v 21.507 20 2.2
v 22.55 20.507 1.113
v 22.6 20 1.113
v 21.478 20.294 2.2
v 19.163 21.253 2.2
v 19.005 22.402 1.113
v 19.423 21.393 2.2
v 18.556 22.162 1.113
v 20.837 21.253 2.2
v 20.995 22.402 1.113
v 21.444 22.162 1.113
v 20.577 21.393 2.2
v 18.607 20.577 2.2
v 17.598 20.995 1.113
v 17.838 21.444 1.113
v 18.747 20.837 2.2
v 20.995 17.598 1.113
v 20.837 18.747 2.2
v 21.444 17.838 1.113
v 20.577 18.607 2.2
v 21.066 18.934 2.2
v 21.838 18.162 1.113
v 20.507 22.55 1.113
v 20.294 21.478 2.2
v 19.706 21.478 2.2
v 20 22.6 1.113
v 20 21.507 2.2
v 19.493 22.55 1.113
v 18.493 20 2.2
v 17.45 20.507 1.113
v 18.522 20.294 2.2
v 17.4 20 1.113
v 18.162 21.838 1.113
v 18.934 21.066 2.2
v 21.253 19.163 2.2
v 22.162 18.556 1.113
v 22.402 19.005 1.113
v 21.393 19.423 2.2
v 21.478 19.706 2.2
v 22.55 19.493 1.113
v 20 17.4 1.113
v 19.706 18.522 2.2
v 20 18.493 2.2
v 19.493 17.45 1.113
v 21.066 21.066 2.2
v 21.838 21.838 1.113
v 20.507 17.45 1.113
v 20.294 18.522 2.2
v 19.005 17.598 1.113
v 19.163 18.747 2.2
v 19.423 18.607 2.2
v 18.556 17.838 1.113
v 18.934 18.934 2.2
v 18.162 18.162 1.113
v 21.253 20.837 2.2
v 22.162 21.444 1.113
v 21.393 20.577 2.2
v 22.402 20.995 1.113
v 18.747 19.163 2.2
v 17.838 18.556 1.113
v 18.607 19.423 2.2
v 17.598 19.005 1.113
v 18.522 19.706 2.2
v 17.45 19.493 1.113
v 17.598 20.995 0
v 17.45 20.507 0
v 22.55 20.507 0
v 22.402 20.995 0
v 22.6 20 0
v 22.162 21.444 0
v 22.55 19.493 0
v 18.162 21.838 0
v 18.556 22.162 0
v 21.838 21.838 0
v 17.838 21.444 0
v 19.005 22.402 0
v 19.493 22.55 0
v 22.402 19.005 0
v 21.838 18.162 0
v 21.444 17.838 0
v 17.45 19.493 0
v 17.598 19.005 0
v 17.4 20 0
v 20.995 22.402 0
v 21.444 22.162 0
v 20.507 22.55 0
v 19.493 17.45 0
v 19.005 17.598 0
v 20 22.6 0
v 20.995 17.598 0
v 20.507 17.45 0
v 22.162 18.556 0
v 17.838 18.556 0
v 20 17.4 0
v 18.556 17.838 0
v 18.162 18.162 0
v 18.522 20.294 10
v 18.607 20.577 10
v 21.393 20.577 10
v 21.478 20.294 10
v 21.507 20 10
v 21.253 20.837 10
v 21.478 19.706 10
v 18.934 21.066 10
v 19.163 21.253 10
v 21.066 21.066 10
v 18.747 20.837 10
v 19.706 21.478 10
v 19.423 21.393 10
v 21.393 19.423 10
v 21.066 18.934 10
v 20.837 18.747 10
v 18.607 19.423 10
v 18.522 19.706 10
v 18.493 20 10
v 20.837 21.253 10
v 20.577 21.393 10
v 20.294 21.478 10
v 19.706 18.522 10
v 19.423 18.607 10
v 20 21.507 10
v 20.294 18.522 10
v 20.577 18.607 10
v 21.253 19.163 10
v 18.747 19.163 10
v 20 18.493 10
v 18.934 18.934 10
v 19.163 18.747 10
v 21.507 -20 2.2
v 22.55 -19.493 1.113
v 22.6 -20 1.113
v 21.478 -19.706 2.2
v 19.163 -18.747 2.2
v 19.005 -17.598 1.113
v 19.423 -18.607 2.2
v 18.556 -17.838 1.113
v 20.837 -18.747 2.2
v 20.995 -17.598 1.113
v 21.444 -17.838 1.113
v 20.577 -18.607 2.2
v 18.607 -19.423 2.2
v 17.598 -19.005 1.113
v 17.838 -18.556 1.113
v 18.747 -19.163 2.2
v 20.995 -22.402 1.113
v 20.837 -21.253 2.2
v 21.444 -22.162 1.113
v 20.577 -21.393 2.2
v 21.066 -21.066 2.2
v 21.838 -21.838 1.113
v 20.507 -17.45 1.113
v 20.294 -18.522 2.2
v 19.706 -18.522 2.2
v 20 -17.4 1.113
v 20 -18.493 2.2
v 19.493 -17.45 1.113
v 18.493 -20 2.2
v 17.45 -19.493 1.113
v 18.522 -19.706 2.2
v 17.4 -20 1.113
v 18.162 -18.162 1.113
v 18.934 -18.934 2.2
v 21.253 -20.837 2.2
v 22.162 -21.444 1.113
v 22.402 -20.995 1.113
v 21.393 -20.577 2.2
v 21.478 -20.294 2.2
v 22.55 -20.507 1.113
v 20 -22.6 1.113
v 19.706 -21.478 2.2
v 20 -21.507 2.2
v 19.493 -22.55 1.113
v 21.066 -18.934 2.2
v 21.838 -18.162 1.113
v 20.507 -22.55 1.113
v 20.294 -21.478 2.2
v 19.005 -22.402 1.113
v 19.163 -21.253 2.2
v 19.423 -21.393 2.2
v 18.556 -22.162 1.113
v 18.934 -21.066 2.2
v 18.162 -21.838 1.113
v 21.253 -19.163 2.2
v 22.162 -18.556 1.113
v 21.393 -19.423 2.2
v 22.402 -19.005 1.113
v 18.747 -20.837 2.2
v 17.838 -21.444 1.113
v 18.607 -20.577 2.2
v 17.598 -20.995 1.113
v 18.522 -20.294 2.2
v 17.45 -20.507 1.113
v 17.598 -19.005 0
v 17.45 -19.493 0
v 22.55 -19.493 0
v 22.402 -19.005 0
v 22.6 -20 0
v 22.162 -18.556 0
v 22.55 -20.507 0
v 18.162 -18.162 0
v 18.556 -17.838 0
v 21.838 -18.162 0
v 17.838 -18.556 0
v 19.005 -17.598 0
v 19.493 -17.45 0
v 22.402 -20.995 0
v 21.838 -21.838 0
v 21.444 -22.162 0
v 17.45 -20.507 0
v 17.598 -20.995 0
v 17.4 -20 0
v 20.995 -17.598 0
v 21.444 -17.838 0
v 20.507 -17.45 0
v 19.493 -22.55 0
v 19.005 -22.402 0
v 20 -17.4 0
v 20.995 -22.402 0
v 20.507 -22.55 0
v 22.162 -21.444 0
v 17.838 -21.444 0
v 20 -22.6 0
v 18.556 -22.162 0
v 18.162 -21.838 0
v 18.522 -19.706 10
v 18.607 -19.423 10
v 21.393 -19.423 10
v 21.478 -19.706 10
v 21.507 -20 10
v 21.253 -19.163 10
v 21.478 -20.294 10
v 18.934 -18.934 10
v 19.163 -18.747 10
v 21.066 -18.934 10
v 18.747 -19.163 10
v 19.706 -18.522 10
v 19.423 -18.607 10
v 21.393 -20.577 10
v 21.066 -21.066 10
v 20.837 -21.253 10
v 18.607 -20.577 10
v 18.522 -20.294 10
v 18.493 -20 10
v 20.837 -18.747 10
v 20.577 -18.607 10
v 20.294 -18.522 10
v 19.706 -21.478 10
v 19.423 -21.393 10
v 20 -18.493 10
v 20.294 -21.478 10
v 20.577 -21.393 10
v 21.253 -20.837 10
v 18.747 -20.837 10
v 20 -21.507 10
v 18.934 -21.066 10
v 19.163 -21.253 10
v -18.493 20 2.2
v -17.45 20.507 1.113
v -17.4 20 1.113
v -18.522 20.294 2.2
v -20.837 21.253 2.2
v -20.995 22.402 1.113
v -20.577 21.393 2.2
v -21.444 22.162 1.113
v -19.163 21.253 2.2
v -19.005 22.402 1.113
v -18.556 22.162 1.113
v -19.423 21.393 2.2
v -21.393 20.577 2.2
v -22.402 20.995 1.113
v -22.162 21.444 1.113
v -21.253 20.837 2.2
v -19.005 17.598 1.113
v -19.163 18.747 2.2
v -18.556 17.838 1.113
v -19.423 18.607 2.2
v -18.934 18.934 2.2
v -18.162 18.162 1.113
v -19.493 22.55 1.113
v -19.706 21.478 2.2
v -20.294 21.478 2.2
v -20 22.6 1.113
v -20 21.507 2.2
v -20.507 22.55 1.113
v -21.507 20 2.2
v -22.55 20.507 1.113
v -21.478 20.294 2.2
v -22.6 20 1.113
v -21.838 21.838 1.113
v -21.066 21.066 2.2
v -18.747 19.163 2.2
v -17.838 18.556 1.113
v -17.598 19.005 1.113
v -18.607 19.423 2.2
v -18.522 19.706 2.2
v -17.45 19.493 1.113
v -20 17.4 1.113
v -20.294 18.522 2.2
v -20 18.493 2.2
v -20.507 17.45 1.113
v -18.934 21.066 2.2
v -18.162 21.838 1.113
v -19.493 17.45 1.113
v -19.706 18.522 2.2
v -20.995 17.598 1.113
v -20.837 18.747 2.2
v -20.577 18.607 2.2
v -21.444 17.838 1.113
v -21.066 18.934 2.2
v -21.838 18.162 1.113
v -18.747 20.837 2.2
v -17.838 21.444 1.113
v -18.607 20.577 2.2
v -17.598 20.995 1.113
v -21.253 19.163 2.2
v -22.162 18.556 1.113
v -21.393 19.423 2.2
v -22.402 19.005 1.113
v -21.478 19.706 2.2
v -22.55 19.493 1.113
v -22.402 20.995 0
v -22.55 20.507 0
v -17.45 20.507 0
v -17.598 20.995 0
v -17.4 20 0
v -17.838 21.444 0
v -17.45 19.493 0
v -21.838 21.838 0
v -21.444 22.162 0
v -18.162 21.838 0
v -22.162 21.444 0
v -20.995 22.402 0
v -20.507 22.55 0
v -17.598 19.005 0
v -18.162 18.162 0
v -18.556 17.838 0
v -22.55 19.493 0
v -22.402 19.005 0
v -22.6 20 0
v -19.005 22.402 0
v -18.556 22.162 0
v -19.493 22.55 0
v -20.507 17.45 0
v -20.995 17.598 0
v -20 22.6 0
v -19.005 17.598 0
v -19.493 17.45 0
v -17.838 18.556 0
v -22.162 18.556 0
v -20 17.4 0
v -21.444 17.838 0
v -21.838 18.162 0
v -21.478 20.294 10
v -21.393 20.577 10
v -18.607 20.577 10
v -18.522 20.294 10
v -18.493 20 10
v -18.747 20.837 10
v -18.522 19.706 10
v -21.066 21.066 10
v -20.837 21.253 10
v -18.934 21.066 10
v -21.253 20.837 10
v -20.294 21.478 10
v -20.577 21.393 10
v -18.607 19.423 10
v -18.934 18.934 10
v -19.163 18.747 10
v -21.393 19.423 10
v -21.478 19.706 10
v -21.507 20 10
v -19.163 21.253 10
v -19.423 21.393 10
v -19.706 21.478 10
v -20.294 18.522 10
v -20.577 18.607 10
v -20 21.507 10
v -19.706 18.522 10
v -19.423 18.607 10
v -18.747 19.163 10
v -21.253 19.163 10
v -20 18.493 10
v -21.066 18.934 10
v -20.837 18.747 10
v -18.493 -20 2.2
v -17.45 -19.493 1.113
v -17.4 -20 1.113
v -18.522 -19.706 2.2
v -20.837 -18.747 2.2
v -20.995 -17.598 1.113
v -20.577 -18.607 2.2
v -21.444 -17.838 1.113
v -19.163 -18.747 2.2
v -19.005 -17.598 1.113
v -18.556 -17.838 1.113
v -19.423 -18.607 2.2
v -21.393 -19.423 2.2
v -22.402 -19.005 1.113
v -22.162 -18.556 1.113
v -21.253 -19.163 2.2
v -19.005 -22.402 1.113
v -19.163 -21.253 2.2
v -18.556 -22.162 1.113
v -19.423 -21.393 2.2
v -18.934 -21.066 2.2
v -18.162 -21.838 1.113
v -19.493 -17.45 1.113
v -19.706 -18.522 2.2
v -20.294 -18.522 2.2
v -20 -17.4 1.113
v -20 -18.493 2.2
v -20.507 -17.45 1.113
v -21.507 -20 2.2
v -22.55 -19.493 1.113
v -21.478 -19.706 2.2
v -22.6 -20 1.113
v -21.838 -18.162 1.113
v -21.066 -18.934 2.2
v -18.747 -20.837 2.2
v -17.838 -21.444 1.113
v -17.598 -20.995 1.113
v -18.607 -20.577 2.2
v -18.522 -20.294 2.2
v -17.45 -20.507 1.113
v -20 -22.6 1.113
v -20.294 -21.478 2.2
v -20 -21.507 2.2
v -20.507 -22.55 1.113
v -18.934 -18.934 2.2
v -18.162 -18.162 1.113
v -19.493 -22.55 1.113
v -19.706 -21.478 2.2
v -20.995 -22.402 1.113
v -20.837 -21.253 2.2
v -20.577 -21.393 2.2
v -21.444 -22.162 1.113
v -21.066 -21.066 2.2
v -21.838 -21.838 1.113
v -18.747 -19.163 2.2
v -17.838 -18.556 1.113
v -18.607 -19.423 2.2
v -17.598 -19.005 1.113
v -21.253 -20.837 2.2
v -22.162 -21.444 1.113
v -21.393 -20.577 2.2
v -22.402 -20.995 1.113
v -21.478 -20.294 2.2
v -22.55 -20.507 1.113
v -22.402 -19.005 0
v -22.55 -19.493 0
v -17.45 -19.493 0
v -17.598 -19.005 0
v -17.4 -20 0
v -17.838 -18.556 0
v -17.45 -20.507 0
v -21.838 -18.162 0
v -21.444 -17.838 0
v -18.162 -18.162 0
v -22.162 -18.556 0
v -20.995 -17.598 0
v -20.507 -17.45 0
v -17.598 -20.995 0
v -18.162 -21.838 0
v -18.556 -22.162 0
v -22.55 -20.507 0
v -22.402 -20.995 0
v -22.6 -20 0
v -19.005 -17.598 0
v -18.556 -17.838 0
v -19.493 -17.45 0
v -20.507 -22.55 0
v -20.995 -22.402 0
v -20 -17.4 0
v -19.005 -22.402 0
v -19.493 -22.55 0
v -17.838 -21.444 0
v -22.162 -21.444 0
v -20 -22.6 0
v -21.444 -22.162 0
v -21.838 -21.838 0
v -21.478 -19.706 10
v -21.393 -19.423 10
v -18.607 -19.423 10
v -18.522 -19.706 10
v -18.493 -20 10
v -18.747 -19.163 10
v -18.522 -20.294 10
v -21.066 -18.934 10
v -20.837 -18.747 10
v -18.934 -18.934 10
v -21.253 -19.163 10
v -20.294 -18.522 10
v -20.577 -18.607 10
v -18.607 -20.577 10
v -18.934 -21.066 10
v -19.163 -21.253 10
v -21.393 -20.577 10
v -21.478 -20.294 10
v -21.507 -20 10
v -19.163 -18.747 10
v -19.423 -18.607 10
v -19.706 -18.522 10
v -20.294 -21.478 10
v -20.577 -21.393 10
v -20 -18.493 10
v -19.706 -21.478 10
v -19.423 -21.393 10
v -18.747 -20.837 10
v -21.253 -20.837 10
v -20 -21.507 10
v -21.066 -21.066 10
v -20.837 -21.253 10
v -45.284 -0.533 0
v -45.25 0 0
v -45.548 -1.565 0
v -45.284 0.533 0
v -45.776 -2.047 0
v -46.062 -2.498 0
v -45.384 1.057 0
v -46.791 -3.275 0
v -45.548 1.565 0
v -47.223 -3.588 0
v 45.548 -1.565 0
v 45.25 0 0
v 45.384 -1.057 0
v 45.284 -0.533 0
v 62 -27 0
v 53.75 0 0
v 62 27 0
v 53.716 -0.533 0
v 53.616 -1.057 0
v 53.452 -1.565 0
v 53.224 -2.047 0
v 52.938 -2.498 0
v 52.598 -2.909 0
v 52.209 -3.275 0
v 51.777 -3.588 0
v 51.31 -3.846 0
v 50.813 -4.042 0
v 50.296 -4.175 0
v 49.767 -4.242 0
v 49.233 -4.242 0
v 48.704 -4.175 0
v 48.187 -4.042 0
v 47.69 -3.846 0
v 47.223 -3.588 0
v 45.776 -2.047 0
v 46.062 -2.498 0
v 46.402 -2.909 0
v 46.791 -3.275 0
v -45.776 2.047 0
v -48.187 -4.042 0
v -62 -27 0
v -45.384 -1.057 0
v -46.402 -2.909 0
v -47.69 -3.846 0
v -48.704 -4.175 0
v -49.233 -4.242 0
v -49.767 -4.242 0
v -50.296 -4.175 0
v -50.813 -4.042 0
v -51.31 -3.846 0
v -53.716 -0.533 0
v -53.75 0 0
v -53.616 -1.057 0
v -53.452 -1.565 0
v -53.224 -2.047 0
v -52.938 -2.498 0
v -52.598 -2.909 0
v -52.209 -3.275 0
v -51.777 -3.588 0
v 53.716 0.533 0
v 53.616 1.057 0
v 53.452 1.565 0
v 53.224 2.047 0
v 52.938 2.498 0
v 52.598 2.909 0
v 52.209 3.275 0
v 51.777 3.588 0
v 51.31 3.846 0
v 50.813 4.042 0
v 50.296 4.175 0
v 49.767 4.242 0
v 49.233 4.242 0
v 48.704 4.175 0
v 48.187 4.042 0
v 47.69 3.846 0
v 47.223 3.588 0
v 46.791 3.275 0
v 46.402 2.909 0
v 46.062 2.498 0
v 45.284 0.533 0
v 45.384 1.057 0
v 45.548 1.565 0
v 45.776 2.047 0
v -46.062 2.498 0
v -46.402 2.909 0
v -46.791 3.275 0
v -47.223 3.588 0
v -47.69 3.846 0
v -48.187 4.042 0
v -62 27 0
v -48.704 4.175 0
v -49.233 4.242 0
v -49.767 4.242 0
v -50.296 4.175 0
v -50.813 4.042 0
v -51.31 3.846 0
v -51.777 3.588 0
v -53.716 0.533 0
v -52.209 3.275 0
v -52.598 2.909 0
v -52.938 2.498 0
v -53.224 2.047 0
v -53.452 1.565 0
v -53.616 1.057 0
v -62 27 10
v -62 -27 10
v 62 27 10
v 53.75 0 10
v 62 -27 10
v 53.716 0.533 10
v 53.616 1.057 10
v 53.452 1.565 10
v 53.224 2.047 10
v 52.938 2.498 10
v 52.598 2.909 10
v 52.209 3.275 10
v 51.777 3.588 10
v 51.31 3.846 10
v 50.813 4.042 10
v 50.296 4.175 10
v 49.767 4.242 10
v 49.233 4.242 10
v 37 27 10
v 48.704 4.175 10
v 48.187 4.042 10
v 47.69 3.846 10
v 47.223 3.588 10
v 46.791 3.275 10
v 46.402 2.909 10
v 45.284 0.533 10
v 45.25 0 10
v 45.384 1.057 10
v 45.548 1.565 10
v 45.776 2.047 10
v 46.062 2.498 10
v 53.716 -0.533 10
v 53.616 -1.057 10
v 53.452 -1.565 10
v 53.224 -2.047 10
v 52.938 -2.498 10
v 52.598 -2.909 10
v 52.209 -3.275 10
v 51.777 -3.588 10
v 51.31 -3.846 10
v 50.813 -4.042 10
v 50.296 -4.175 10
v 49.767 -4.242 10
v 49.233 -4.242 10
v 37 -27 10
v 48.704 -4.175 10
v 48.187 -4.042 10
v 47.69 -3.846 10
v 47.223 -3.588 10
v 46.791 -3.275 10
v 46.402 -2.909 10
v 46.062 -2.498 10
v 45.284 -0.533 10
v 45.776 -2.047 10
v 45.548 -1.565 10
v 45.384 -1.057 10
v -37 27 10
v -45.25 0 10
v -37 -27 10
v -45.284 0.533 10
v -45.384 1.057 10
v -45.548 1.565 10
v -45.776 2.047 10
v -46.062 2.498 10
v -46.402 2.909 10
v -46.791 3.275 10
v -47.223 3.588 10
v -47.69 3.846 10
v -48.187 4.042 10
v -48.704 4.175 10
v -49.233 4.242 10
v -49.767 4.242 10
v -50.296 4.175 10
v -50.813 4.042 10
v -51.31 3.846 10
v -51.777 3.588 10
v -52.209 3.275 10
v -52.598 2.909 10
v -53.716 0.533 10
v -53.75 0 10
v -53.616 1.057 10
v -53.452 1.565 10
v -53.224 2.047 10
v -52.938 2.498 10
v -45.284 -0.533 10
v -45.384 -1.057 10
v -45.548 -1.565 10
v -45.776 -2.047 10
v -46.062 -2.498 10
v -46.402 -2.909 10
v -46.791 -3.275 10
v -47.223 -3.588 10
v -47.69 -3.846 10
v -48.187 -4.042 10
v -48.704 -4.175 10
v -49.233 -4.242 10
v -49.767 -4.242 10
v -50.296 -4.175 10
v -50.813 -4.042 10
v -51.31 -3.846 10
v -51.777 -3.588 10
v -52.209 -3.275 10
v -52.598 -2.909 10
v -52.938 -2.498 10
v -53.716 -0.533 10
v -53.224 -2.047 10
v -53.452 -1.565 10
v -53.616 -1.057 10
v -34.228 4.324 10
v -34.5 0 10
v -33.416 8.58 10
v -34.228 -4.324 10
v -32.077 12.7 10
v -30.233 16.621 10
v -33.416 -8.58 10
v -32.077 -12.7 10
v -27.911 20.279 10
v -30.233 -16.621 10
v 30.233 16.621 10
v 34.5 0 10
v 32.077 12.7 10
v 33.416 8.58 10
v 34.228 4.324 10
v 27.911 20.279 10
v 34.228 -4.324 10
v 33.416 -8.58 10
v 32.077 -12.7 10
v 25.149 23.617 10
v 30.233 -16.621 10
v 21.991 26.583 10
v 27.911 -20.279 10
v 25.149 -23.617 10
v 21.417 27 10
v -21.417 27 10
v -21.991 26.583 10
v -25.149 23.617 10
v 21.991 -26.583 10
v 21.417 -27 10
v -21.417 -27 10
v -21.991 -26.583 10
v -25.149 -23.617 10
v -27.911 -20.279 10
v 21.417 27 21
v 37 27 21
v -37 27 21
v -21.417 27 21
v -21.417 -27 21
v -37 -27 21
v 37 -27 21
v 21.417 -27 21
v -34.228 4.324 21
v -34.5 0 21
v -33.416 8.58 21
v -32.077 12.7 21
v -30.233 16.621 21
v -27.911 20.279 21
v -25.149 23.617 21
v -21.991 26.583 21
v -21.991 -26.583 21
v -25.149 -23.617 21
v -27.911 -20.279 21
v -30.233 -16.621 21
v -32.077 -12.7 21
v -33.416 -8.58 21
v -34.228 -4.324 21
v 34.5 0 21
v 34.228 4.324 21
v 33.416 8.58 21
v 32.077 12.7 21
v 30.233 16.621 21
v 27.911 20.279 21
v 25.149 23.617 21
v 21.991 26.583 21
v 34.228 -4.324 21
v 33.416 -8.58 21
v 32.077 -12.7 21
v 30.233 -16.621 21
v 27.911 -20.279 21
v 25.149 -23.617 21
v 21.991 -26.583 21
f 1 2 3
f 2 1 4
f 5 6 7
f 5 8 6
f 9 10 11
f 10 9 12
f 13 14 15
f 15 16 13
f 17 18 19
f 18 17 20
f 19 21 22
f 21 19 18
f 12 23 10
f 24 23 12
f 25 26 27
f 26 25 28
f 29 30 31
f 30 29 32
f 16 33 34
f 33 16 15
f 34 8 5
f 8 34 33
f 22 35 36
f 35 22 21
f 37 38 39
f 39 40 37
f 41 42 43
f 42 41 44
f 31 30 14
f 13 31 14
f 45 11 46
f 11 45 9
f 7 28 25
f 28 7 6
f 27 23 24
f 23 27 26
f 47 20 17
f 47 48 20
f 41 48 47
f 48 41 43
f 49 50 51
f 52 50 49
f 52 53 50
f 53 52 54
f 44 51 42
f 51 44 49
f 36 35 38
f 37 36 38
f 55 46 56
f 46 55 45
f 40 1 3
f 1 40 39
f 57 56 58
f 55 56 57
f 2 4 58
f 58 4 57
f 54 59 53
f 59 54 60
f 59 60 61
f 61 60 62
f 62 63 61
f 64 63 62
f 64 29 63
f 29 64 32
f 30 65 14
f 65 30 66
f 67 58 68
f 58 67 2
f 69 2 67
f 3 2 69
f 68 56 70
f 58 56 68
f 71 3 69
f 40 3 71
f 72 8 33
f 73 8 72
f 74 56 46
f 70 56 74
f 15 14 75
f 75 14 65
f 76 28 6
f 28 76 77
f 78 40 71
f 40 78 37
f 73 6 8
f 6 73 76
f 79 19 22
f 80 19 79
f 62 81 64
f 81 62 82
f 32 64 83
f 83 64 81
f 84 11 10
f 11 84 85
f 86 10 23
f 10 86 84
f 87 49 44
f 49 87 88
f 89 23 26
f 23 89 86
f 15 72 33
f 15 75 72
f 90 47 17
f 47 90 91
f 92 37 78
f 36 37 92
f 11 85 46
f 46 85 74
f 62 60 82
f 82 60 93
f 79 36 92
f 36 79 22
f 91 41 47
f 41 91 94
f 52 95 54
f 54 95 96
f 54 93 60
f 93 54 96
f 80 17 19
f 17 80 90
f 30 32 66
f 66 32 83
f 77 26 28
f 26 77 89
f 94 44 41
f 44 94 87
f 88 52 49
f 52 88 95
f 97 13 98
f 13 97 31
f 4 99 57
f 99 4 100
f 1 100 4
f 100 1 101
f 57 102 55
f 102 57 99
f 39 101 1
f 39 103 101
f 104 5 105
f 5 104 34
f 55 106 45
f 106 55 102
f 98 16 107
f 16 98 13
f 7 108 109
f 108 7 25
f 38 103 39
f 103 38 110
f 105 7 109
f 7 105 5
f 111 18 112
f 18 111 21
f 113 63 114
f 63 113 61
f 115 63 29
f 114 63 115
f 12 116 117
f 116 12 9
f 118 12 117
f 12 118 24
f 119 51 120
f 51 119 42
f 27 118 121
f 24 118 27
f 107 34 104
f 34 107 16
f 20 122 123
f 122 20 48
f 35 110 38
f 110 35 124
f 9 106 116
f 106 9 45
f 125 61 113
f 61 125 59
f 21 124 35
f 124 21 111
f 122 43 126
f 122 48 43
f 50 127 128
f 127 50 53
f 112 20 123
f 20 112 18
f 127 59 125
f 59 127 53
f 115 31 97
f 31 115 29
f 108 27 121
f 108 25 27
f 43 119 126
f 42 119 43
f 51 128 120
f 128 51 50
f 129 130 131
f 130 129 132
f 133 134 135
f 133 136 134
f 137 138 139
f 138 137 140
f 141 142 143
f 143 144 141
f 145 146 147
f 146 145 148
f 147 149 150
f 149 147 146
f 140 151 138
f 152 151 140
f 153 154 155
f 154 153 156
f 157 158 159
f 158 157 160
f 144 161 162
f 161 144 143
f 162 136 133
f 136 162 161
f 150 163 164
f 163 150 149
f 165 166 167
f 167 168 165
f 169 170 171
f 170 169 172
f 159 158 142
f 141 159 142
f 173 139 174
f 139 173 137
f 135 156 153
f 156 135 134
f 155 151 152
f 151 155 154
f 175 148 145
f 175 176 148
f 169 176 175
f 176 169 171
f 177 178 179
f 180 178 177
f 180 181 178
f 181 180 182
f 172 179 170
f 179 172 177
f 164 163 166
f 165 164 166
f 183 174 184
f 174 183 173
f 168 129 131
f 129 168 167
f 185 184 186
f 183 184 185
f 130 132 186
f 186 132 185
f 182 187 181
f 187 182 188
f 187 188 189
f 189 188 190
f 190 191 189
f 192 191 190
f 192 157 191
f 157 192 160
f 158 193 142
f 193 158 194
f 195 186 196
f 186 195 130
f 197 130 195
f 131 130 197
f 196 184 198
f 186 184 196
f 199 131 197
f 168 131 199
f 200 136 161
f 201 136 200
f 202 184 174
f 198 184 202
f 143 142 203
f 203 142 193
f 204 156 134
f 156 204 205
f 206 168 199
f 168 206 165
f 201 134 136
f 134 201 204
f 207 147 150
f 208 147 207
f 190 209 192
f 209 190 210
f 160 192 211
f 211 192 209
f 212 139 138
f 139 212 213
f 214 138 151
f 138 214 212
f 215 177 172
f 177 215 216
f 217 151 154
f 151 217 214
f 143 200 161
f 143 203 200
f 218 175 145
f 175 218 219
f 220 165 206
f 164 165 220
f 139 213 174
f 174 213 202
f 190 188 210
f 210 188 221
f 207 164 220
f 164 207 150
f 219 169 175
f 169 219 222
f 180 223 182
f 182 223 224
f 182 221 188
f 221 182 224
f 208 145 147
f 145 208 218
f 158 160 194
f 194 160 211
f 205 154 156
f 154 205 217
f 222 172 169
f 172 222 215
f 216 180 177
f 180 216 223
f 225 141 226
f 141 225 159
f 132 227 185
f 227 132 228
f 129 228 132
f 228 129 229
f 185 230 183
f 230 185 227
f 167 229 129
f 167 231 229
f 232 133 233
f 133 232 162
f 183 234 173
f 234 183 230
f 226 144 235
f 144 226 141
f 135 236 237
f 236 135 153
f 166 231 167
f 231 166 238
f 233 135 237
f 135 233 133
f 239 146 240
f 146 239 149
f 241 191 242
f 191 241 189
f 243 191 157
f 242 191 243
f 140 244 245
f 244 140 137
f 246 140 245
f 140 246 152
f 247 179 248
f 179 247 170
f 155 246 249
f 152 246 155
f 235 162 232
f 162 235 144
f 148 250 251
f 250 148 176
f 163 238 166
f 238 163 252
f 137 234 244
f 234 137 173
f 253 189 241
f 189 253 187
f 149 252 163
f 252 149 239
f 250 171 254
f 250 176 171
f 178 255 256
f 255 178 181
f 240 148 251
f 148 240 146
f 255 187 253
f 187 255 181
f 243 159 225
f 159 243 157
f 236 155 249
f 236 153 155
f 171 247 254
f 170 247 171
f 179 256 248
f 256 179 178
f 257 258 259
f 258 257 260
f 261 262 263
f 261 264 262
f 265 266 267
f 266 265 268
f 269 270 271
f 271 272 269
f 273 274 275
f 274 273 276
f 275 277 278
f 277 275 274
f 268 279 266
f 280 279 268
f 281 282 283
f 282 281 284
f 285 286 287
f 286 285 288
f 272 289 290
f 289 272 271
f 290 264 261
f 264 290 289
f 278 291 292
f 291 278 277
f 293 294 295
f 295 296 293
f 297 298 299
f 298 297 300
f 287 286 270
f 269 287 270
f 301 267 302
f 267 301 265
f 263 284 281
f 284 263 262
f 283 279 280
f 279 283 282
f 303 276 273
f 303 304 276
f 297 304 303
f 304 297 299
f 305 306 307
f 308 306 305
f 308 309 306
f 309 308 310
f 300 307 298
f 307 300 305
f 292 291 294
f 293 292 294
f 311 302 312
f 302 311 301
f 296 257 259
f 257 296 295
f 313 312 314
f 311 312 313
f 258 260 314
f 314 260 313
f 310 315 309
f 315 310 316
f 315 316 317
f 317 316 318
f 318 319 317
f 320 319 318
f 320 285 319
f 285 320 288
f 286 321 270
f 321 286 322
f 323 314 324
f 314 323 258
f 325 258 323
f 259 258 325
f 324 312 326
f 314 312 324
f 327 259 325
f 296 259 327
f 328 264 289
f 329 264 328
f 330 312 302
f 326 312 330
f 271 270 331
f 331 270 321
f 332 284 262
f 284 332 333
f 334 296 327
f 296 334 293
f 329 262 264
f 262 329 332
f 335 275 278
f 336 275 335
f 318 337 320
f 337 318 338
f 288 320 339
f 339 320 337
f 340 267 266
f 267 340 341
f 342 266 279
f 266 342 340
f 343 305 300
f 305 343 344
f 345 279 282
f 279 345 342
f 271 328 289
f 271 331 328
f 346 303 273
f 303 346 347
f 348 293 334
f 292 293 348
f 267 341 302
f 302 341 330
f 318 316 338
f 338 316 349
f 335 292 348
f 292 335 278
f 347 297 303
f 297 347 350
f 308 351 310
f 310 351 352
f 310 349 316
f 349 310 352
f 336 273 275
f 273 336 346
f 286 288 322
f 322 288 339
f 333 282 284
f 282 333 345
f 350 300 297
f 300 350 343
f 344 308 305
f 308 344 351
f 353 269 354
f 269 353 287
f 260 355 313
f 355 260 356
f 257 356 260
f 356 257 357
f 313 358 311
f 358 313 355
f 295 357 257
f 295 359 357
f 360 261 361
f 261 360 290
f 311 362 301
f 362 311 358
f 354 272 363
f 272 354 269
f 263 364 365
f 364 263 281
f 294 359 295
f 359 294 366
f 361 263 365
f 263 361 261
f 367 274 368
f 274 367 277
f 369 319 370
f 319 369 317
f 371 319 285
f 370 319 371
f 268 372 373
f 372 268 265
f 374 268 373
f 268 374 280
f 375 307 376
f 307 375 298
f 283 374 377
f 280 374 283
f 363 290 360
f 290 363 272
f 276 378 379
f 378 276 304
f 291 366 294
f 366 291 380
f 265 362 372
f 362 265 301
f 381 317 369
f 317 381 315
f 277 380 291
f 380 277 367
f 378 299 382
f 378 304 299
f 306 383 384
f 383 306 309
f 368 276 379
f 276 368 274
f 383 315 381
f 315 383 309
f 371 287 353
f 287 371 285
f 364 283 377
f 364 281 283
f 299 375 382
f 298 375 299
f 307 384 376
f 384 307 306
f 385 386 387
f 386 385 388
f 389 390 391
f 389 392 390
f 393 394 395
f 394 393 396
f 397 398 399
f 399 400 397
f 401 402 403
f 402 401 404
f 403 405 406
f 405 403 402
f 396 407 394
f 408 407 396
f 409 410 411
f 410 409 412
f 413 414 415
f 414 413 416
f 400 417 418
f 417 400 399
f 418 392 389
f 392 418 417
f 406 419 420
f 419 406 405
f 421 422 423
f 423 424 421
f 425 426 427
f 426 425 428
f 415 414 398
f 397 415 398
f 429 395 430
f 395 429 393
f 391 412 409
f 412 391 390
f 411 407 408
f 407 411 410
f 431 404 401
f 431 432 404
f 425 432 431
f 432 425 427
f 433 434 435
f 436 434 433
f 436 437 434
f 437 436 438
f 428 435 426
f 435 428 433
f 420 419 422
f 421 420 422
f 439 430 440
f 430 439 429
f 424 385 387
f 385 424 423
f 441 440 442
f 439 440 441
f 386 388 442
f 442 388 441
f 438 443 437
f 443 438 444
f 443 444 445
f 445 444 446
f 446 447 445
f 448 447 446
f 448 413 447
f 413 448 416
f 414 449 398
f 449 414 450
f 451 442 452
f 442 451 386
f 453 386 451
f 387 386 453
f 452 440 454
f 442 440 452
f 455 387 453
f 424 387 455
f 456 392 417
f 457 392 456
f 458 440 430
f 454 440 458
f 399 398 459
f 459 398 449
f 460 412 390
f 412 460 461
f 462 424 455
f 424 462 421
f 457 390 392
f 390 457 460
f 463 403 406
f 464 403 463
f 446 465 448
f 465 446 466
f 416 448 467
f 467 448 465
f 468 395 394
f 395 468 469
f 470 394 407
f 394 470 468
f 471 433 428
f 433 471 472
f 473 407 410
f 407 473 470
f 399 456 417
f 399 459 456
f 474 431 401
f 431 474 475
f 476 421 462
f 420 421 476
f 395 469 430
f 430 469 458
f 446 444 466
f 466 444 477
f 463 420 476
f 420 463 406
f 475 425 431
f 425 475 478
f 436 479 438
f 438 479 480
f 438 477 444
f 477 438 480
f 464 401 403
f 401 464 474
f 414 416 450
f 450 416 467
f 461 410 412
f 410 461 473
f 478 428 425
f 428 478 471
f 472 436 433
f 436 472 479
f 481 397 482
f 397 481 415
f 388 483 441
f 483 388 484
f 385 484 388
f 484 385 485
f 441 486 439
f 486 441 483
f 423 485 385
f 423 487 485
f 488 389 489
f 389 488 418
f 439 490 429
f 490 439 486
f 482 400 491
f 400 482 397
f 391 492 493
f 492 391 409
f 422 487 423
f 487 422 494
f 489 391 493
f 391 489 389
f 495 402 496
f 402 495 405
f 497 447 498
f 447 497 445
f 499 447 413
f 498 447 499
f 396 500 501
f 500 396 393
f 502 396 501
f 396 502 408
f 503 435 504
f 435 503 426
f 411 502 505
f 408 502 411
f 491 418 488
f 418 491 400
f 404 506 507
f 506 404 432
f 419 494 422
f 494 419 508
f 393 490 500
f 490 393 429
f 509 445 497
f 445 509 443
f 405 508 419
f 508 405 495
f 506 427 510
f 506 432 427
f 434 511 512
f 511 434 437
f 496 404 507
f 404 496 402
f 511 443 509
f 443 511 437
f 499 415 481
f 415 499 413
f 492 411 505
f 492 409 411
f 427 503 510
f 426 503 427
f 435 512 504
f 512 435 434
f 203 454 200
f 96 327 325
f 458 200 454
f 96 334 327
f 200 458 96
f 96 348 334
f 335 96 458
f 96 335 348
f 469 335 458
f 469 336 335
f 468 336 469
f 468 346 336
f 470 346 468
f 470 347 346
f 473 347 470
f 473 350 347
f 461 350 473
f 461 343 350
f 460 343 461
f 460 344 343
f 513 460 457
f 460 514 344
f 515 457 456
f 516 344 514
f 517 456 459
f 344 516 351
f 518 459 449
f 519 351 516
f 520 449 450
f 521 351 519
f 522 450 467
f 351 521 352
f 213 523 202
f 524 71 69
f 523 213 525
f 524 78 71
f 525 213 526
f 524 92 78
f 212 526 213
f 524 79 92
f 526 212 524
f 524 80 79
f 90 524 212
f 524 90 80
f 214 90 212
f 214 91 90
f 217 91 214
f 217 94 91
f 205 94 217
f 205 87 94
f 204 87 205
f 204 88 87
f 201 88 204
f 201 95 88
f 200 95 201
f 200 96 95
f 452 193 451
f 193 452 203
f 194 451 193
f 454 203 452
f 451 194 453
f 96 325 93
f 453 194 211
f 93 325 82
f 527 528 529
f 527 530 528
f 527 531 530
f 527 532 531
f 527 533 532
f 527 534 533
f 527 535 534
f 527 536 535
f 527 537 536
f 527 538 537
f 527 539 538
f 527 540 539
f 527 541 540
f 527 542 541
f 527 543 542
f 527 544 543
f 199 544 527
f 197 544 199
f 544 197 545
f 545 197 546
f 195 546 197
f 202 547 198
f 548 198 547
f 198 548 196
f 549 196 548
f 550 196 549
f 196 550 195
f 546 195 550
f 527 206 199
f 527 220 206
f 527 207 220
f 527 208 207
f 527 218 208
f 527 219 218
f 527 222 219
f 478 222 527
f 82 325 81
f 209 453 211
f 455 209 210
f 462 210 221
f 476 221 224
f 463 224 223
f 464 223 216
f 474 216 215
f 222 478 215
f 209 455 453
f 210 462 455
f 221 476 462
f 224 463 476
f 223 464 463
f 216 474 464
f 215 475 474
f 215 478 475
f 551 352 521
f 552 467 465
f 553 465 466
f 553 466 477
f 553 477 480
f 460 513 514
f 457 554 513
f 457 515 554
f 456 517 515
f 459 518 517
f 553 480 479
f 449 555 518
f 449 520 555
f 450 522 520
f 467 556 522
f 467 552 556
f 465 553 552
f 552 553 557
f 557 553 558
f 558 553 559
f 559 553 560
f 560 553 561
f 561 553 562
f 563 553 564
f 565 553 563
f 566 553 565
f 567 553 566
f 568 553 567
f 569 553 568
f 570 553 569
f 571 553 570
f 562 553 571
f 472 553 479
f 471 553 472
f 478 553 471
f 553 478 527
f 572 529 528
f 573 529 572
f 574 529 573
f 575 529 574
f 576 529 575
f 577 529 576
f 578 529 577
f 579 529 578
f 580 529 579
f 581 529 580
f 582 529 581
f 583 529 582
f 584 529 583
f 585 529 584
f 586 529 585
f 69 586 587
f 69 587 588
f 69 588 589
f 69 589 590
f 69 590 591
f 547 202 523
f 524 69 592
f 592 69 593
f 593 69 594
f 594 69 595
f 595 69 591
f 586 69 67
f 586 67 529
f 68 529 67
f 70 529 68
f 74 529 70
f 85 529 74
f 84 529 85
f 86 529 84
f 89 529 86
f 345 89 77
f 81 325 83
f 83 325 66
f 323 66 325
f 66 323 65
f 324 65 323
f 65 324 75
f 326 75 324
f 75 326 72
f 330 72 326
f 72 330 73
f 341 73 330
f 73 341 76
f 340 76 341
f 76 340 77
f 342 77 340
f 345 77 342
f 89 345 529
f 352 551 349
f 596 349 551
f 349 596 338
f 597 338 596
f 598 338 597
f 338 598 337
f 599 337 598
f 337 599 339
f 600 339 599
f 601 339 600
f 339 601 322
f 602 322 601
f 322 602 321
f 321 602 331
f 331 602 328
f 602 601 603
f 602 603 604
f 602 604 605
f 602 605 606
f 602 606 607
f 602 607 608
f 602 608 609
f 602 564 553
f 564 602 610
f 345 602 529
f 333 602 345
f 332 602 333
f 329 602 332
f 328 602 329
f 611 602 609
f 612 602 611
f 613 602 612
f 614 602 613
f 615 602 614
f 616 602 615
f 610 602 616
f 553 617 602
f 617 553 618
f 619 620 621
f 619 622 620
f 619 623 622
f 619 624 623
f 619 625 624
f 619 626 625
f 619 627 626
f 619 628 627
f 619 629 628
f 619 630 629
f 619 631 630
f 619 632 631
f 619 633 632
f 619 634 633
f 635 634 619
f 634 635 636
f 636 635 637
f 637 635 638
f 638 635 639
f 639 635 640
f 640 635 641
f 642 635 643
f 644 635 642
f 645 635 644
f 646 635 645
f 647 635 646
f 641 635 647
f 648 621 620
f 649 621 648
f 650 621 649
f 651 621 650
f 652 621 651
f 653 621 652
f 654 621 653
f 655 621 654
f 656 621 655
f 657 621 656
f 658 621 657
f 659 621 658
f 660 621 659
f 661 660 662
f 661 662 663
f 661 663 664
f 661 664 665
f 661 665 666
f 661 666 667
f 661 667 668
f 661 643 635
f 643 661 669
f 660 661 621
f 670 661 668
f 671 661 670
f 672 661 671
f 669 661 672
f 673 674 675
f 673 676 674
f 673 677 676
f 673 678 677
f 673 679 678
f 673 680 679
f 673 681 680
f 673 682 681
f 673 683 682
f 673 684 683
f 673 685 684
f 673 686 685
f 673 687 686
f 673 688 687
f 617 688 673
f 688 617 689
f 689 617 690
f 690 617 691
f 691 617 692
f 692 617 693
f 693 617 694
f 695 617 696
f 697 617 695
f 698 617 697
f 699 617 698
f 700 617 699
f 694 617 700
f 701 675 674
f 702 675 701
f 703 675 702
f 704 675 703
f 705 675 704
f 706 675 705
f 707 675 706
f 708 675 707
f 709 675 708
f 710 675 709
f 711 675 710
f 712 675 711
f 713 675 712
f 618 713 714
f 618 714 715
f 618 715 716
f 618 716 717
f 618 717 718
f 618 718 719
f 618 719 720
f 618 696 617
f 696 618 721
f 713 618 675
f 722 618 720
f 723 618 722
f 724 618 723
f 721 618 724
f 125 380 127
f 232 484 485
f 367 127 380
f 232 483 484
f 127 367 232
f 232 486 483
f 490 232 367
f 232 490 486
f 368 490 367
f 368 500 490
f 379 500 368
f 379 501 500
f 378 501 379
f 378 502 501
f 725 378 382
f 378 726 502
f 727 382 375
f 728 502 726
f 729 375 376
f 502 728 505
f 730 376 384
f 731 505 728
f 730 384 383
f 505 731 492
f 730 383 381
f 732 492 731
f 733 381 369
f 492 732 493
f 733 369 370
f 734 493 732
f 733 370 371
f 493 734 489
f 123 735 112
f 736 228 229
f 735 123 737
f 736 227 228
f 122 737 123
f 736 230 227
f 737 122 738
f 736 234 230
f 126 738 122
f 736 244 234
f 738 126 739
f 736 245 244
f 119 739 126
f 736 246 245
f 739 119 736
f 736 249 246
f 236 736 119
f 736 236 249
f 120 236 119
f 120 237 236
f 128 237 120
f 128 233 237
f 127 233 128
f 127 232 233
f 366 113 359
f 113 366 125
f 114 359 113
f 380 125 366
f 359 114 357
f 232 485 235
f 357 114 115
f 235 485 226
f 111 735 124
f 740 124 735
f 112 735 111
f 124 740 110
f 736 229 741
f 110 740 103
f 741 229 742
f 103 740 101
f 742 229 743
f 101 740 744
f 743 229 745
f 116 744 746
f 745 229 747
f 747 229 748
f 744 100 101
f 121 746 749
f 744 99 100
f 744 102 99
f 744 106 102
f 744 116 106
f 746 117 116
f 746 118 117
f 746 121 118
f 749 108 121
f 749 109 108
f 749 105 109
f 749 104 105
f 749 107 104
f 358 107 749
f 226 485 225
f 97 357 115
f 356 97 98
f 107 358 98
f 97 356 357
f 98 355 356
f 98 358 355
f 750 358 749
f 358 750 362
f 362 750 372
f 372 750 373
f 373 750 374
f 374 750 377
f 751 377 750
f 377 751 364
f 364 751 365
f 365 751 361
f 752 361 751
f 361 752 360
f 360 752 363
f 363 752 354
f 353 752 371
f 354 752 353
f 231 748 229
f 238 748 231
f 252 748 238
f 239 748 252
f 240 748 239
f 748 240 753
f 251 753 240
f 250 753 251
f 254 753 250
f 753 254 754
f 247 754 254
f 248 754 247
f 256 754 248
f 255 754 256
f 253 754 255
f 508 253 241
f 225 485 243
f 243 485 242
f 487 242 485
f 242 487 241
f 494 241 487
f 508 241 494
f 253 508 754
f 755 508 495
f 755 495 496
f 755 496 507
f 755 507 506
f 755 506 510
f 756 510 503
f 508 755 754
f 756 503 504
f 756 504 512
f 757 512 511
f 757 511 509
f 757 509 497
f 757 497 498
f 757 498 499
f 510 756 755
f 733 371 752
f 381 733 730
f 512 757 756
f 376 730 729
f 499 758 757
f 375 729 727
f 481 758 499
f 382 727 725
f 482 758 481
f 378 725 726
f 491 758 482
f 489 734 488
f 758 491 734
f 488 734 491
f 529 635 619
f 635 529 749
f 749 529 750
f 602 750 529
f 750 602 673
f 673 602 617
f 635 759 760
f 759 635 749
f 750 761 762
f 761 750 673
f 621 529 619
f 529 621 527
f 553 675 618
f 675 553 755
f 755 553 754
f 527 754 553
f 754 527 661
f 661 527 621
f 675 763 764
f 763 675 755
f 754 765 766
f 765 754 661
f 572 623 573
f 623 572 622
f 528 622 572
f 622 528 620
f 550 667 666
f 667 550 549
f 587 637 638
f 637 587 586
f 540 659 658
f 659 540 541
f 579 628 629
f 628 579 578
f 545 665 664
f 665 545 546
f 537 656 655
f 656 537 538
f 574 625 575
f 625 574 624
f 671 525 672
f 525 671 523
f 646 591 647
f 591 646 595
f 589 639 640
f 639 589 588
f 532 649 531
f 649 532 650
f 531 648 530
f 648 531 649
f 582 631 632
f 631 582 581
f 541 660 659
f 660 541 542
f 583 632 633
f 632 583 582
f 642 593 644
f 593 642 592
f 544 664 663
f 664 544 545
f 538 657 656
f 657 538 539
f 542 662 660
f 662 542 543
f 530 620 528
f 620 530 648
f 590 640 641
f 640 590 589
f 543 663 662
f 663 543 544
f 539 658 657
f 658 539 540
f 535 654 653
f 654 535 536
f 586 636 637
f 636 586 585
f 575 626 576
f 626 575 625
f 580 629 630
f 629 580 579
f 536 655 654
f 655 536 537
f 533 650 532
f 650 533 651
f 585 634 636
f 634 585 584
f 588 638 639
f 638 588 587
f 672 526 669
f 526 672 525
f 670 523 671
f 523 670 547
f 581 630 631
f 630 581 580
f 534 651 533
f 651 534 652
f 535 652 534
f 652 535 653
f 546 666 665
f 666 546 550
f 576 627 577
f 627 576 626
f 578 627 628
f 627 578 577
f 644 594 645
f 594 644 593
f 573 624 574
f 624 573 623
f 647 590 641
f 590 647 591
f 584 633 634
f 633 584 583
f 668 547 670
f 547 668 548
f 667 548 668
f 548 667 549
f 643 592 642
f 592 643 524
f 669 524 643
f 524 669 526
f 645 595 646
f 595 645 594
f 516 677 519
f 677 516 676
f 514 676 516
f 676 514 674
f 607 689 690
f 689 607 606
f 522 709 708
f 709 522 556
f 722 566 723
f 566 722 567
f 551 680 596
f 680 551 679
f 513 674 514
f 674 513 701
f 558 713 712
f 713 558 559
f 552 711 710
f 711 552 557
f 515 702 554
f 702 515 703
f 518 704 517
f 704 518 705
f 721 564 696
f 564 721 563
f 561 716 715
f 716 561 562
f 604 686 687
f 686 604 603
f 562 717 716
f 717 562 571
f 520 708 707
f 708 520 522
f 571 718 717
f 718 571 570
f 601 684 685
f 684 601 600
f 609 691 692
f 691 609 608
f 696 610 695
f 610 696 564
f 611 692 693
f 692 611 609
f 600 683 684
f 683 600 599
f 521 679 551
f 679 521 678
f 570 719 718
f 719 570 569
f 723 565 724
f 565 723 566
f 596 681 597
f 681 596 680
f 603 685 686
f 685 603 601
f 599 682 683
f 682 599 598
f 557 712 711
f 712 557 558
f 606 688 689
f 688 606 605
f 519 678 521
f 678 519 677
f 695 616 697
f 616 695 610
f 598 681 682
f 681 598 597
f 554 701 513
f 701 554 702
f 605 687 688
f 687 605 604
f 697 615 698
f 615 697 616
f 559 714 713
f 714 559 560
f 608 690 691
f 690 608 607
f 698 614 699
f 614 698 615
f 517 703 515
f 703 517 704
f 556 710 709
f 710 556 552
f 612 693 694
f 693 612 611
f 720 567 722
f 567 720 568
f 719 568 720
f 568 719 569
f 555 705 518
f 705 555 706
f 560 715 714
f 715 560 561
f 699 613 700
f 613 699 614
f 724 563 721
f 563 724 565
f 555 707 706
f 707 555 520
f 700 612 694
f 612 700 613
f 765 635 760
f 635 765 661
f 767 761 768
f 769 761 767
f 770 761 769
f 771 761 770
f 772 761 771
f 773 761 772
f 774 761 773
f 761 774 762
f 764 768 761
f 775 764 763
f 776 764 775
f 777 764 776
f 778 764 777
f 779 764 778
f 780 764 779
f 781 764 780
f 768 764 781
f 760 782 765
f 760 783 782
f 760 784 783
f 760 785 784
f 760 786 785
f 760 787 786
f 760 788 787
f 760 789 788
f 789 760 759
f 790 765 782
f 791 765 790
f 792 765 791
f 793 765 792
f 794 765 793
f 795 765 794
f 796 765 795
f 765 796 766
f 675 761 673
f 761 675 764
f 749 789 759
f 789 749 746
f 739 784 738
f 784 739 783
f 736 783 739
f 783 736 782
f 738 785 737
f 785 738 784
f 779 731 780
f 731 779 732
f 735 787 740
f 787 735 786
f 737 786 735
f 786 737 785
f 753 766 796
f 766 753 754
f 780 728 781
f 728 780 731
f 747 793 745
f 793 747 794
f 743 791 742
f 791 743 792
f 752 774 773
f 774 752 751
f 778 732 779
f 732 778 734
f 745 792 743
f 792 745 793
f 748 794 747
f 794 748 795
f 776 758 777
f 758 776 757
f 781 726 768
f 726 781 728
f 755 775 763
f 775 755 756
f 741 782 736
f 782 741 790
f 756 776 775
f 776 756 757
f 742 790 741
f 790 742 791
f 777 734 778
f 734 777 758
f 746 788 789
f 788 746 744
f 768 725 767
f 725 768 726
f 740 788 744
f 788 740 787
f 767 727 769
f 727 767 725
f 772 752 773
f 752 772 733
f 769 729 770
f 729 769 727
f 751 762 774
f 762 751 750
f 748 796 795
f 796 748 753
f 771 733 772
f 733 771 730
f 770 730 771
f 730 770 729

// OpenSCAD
// include external resources
include <screw_holes.scad>
$fn=50;

/* [Antenna] */
antenna_diameter = 69;
antenna_height = 22;
screw_to_border = 7;    // space between M3 hole and border
/* [Hidden] */
distance_between_holes = 40;

/* [Antenna wall] */
wall_height = 0.5*antenna_height;
wall_width = 5; // minimum antenna wall width, some parts will be bigger
wall_thickness = antenna_diameter + wall_width;

/* [Plate handle] */
mount_length = distance_between_holes + (2 * screw_to_border );
half_mount_length = mount_length / 2;

/* [Main Plate] */
plate_handle_length = 25; // distance between wall and border
plate_thickness = 10; // the main thickness of the whole thing
plate_length = wall_thickness + 2*plate_handle_length;
plate_width = mount_length;

/* [M8 screw params(mount)] */
m8_diameter = 8.5;
m8_hole_off = plate_handle_length/2;
m8_screw_hole_x = plate_length/2 - m8_hole_off;

/* [M3 screw params(antenna)] */
m3_screw_top_width = 5;
m3_screw_top_height = 2;
m3_screw_angle = 90;
m3_screw_hole_x = half_mount_length - screw_to_border;
m3_screw_hole_y = half_mount_length - screw_to_border;

// Main Plate
difference(){
    // Base plate
    linear_extrude(plate_thickness){
        square([plate_length, plate_width], center = true);
    }

    // holes for mounting to Alu-profile
    translate([+m8_screw_hole_x, 0, 0]) cylinder(h=plate_thickness, d=m8_diameter);
    translate([-m8_screw_hole_x, 0, 0]) cylinder(h=plate_thickness, d=m8_diameter);

    // holes for mounting antenna
    translate([+m3_screw_hole_x, +m3_screw_hole_y, 0]) screw_hole([m3_screw_top_width, m3_screw_top_height, m3_screw_angle], M3, plate_thickness);
    translate([+m3_screw_hole_x, -m3_screw_hole_y, 0]) screw_hole([m3_screw_top_width, m3_screw_top_height, m3_screw_angle], M3, plate_thickness);
    translate([-m3_screw_hole_x, +m3_screw_hole_y, 0]) screw_hole([m3_screw_top_width, m3_screw_top_height, m3_screw_angle], M3, plate_thickness);
    translate([-m3_screw_hole_x, -m3_screw_hole_y, 0]) screw_hole([m3_screw_top_width, m3_screw_top_height, m3_screw_angle], M3, plate_thickness);
}

// Wall with diameter-wide hole for the antenna
difference() {
    translate([0, 0, plate_thickness+wall_height/2]) cube([wall_thickness, plate_width, wall_height], center=true);
    translate([0, 0, plate_thickness+wall_height/2]) cylinder(h=wall_height, d=antenna_diameter, center=true);
}
